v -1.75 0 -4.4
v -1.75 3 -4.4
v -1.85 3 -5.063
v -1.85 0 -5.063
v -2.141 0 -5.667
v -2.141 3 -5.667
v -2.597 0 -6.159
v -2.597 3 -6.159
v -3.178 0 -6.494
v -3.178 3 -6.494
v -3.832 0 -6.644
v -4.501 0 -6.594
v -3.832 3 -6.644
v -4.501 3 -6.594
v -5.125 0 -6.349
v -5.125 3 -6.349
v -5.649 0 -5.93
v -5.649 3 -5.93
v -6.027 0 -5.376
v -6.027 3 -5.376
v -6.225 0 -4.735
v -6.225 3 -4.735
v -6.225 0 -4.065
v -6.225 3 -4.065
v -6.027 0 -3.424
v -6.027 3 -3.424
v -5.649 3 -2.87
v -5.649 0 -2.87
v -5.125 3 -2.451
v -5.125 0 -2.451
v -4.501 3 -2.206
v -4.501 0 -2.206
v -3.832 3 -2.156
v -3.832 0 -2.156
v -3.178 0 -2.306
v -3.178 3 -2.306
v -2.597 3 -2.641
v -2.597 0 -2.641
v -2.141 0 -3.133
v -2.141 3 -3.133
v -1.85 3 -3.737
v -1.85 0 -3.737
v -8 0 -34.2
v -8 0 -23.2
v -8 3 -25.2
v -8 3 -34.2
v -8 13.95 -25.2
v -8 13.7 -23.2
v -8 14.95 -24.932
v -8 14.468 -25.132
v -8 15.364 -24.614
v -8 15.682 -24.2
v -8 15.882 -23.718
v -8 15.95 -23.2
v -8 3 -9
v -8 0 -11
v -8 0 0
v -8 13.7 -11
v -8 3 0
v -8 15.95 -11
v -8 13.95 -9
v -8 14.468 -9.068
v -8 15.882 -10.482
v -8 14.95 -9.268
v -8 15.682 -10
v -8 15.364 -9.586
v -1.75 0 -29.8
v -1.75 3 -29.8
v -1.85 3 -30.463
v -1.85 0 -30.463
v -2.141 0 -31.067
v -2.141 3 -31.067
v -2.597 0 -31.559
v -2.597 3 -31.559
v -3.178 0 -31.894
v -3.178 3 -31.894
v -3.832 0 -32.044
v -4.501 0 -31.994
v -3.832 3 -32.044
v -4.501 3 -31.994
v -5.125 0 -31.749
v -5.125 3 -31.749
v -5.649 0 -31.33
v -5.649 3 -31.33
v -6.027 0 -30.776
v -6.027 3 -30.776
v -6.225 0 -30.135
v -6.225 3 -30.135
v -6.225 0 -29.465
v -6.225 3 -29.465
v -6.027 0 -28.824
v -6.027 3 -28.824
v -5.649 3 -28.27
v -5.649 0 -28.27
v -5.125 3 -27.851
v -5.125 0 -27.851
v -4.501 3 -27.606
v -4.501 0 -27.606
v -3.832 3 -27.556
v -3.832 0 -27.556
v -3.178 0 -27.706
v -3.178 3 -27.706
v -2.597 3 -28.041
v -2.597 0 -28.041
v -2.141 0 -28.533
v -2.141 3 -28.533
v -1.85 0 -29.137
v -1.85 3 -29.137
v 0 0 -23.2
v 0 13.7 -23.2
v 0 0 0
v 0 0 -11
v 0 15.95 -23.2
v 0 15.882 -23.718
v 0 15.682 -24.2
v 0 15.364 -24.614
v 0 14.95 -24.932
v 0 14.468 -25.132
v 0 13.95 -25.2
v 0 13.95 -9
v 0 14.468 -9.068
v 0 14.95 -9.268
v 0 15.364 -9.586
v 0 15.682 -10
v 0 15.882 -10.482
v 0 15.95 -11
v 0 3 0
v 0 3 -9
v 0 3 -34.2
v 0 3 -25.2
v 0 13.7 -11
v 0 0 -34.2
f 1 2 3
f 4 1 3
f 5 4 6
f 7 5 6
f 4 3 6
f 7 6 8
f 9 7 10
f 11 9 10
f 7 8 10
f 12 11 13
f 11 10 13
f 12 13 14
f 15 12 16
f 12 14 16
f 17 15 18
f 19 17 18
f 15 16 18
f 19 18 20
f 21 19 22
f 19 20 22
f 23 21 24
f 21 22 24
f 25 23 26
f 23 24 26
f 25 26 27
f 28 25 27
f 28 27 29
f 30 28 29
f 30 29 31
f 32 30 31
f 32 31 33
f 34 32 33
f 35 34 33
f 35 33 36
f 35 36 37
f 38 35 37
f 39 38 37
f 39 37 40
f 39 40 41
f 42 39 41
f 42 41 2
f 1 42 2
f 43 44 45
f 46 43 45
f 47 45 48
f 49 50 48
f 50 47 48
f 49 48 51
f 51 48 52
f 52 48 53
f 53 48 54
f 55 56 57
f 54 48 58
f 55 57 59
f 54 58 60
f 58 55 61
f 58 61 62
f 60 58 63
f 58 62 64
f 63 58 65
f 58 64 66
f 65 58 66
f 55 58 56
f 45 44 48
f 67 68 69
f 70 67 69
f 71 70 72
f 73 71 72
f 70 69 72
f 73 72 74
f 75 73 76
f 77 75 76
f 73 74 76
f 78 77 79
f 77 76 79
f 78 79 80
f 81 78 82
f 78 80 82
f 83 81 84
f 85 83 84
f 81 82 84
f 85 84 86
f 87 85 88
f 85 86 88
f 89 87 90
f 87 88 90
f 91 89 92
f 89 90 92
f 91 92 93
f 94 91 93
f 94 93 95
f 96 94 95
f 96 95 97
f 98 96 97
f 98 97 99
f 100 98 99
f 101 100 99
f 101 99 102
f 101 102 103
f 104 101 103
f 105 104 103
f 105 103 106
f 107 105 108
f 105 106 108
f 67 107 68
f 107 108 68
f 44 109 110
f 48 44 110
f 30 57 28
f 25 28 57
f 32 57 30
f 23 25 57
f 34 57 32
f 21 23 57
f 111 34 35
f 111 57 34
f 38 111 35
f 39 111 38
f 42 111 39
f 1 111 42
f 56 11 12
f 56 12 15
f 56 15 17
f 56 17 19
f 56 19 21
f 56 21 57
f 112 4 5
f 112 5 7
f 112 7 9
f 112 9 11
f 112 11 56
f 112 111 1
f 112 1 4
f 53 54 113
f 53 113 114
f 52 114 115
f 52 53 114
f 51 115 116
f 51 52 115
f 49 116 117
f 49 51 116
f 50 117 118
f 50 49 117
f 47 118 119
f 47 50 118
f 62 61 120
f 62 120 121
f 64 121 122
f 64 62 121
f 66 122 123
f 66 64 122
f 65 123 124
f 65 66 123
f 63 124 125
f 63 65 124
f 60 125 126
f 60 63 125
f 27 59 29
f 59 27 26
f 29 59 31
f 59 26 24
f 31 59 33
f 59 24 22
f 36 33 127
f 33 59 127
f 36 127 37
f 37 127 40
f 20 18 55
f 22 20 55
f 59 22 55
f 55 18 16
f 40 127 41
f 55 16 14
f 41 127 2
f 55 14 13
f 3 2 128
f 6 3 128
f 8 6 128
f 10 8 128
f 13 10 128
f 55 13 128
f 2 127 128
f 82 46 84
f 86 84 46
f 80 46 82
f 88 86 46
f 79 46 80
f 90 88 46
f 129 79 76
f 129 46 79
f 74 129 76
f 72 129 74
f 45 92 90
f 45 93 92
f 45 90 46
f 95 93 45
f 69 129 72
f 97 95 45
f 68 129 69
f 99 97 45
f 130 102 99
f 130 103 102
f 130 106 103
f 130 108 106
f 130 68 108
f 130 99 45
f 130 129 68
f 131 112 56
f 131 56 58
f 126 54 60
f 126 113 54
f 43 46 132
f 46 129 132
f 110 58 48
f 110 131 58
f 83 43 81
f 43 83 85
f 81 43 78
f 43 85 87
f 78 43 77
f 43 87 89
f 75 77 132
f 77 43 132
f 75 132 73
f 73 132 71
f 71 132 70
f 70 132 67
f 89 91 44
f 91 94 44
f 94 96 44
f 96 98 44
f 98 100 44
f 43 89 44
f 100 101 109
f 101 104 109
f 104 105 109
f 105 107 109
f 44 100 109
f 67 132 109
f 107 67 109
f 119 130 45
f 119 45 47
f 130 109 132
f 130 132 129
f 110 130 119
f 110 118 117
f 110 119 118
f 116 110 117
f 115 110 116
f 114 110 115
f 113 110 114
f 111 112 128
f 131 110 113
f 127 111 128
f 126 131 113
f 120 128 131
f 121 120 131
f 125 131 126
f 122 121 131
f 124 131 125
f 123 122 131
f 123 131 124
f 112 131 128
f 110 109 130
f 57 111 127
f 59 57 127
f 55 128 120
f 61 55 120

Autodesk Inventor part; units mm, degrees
ref_plane "YZ Plane" through (0, 0, 0) normal (1, 0, 0) x (0, 1, 0)
ref_plane "XZ Plane" through (0, 0, 0) normal (0, 1, 0) x (-1, 0, 0)
ref_plane "XY Plane" through (0, 0, 0) normal (0, 0, 1) x (1, 0, 0)
sketch "Sketch1" plane through (0, 0, 0) normal (1, 0, 0) x (0, 1, 0)
  line L0 (0, 0) -> (3, 0)
  line L1 (3, 0) -> (3, -8.5)
  line L2 (3, -25.7) -> (3, -34.2)
  line L3 (3, -34.2) -> (0, -34.2)
  line L4 (0, -34.2) -> (0, -25.7)
  line L5 (0, -25.7) -> (0, -23.2)
  line L6 (0, -23.2) -> (13.7, -23.2)
  line L7 (0, 0) -> (0, -8.5)
  line L8 (0, -8.5) -> (0, -11)
  line L9 (0, -11) -> (13.7, -11)
  line L10 (13.7, -11) -> (13.7, -23.2)
  line L11 (3, -8.5) -> (3, -9)
  line L12 (3, -25.7) -> (3, -25.2)
  line L13 (3, -9) -> (15.95, -9)
  line L14 (3, -25.2) -> (15.95, -25.2)
  line L15 (15.95, -25.2) -> (15.95, -9)
  dimension "d0" = 3
  dimension "d1" = 8.5
  dimension "d4" = 8.5
  dimension "d8" = 3
  dimension "d12" = 13.7
  dimension "d14" = 12.2
  dimension "d28" = 0.5
  dimension "d29" = 0.5
  dimension "d30" = 2.25
extrude "Extrusion1" add sketch "Sketch1" against normal blind 8
sketch "Sketch3" plane through (0, 3, 0) normal (0, 1, 0) x (1, 0, 0)
  circle A0 centre (-4, 29.8) radius 2.25
  line L0 (0, 34.2) -> (-8, 34.2) projected
  line L1 (0, 34.2) -> (0, 25.2) projected
  line L2 (0, 0) -> (-8, 0) projected
  line L3 (0, 9) -> (0, 0) projected
  circle A1 centre (-4, 4.4) radius 2.25
  point P0 (0, 25.8)
  point P1 (0, 8.5)
  dimension "d16" = 4.5
  dimension "d18" = 4.4
  dimension "d19" = 4
  dimension "d23" = 4.5
  dimension "d24" = 4
  dimension "d25" = 4.4
extrude "Extrusion2" cut sketch "Sketch3" against normal through all
fillet "Fillet1" radius 2 2 edges at (-4, 15.95, -9) (-4, 15.95, -25.2)
properties part number "Linear Actuator Mount"
